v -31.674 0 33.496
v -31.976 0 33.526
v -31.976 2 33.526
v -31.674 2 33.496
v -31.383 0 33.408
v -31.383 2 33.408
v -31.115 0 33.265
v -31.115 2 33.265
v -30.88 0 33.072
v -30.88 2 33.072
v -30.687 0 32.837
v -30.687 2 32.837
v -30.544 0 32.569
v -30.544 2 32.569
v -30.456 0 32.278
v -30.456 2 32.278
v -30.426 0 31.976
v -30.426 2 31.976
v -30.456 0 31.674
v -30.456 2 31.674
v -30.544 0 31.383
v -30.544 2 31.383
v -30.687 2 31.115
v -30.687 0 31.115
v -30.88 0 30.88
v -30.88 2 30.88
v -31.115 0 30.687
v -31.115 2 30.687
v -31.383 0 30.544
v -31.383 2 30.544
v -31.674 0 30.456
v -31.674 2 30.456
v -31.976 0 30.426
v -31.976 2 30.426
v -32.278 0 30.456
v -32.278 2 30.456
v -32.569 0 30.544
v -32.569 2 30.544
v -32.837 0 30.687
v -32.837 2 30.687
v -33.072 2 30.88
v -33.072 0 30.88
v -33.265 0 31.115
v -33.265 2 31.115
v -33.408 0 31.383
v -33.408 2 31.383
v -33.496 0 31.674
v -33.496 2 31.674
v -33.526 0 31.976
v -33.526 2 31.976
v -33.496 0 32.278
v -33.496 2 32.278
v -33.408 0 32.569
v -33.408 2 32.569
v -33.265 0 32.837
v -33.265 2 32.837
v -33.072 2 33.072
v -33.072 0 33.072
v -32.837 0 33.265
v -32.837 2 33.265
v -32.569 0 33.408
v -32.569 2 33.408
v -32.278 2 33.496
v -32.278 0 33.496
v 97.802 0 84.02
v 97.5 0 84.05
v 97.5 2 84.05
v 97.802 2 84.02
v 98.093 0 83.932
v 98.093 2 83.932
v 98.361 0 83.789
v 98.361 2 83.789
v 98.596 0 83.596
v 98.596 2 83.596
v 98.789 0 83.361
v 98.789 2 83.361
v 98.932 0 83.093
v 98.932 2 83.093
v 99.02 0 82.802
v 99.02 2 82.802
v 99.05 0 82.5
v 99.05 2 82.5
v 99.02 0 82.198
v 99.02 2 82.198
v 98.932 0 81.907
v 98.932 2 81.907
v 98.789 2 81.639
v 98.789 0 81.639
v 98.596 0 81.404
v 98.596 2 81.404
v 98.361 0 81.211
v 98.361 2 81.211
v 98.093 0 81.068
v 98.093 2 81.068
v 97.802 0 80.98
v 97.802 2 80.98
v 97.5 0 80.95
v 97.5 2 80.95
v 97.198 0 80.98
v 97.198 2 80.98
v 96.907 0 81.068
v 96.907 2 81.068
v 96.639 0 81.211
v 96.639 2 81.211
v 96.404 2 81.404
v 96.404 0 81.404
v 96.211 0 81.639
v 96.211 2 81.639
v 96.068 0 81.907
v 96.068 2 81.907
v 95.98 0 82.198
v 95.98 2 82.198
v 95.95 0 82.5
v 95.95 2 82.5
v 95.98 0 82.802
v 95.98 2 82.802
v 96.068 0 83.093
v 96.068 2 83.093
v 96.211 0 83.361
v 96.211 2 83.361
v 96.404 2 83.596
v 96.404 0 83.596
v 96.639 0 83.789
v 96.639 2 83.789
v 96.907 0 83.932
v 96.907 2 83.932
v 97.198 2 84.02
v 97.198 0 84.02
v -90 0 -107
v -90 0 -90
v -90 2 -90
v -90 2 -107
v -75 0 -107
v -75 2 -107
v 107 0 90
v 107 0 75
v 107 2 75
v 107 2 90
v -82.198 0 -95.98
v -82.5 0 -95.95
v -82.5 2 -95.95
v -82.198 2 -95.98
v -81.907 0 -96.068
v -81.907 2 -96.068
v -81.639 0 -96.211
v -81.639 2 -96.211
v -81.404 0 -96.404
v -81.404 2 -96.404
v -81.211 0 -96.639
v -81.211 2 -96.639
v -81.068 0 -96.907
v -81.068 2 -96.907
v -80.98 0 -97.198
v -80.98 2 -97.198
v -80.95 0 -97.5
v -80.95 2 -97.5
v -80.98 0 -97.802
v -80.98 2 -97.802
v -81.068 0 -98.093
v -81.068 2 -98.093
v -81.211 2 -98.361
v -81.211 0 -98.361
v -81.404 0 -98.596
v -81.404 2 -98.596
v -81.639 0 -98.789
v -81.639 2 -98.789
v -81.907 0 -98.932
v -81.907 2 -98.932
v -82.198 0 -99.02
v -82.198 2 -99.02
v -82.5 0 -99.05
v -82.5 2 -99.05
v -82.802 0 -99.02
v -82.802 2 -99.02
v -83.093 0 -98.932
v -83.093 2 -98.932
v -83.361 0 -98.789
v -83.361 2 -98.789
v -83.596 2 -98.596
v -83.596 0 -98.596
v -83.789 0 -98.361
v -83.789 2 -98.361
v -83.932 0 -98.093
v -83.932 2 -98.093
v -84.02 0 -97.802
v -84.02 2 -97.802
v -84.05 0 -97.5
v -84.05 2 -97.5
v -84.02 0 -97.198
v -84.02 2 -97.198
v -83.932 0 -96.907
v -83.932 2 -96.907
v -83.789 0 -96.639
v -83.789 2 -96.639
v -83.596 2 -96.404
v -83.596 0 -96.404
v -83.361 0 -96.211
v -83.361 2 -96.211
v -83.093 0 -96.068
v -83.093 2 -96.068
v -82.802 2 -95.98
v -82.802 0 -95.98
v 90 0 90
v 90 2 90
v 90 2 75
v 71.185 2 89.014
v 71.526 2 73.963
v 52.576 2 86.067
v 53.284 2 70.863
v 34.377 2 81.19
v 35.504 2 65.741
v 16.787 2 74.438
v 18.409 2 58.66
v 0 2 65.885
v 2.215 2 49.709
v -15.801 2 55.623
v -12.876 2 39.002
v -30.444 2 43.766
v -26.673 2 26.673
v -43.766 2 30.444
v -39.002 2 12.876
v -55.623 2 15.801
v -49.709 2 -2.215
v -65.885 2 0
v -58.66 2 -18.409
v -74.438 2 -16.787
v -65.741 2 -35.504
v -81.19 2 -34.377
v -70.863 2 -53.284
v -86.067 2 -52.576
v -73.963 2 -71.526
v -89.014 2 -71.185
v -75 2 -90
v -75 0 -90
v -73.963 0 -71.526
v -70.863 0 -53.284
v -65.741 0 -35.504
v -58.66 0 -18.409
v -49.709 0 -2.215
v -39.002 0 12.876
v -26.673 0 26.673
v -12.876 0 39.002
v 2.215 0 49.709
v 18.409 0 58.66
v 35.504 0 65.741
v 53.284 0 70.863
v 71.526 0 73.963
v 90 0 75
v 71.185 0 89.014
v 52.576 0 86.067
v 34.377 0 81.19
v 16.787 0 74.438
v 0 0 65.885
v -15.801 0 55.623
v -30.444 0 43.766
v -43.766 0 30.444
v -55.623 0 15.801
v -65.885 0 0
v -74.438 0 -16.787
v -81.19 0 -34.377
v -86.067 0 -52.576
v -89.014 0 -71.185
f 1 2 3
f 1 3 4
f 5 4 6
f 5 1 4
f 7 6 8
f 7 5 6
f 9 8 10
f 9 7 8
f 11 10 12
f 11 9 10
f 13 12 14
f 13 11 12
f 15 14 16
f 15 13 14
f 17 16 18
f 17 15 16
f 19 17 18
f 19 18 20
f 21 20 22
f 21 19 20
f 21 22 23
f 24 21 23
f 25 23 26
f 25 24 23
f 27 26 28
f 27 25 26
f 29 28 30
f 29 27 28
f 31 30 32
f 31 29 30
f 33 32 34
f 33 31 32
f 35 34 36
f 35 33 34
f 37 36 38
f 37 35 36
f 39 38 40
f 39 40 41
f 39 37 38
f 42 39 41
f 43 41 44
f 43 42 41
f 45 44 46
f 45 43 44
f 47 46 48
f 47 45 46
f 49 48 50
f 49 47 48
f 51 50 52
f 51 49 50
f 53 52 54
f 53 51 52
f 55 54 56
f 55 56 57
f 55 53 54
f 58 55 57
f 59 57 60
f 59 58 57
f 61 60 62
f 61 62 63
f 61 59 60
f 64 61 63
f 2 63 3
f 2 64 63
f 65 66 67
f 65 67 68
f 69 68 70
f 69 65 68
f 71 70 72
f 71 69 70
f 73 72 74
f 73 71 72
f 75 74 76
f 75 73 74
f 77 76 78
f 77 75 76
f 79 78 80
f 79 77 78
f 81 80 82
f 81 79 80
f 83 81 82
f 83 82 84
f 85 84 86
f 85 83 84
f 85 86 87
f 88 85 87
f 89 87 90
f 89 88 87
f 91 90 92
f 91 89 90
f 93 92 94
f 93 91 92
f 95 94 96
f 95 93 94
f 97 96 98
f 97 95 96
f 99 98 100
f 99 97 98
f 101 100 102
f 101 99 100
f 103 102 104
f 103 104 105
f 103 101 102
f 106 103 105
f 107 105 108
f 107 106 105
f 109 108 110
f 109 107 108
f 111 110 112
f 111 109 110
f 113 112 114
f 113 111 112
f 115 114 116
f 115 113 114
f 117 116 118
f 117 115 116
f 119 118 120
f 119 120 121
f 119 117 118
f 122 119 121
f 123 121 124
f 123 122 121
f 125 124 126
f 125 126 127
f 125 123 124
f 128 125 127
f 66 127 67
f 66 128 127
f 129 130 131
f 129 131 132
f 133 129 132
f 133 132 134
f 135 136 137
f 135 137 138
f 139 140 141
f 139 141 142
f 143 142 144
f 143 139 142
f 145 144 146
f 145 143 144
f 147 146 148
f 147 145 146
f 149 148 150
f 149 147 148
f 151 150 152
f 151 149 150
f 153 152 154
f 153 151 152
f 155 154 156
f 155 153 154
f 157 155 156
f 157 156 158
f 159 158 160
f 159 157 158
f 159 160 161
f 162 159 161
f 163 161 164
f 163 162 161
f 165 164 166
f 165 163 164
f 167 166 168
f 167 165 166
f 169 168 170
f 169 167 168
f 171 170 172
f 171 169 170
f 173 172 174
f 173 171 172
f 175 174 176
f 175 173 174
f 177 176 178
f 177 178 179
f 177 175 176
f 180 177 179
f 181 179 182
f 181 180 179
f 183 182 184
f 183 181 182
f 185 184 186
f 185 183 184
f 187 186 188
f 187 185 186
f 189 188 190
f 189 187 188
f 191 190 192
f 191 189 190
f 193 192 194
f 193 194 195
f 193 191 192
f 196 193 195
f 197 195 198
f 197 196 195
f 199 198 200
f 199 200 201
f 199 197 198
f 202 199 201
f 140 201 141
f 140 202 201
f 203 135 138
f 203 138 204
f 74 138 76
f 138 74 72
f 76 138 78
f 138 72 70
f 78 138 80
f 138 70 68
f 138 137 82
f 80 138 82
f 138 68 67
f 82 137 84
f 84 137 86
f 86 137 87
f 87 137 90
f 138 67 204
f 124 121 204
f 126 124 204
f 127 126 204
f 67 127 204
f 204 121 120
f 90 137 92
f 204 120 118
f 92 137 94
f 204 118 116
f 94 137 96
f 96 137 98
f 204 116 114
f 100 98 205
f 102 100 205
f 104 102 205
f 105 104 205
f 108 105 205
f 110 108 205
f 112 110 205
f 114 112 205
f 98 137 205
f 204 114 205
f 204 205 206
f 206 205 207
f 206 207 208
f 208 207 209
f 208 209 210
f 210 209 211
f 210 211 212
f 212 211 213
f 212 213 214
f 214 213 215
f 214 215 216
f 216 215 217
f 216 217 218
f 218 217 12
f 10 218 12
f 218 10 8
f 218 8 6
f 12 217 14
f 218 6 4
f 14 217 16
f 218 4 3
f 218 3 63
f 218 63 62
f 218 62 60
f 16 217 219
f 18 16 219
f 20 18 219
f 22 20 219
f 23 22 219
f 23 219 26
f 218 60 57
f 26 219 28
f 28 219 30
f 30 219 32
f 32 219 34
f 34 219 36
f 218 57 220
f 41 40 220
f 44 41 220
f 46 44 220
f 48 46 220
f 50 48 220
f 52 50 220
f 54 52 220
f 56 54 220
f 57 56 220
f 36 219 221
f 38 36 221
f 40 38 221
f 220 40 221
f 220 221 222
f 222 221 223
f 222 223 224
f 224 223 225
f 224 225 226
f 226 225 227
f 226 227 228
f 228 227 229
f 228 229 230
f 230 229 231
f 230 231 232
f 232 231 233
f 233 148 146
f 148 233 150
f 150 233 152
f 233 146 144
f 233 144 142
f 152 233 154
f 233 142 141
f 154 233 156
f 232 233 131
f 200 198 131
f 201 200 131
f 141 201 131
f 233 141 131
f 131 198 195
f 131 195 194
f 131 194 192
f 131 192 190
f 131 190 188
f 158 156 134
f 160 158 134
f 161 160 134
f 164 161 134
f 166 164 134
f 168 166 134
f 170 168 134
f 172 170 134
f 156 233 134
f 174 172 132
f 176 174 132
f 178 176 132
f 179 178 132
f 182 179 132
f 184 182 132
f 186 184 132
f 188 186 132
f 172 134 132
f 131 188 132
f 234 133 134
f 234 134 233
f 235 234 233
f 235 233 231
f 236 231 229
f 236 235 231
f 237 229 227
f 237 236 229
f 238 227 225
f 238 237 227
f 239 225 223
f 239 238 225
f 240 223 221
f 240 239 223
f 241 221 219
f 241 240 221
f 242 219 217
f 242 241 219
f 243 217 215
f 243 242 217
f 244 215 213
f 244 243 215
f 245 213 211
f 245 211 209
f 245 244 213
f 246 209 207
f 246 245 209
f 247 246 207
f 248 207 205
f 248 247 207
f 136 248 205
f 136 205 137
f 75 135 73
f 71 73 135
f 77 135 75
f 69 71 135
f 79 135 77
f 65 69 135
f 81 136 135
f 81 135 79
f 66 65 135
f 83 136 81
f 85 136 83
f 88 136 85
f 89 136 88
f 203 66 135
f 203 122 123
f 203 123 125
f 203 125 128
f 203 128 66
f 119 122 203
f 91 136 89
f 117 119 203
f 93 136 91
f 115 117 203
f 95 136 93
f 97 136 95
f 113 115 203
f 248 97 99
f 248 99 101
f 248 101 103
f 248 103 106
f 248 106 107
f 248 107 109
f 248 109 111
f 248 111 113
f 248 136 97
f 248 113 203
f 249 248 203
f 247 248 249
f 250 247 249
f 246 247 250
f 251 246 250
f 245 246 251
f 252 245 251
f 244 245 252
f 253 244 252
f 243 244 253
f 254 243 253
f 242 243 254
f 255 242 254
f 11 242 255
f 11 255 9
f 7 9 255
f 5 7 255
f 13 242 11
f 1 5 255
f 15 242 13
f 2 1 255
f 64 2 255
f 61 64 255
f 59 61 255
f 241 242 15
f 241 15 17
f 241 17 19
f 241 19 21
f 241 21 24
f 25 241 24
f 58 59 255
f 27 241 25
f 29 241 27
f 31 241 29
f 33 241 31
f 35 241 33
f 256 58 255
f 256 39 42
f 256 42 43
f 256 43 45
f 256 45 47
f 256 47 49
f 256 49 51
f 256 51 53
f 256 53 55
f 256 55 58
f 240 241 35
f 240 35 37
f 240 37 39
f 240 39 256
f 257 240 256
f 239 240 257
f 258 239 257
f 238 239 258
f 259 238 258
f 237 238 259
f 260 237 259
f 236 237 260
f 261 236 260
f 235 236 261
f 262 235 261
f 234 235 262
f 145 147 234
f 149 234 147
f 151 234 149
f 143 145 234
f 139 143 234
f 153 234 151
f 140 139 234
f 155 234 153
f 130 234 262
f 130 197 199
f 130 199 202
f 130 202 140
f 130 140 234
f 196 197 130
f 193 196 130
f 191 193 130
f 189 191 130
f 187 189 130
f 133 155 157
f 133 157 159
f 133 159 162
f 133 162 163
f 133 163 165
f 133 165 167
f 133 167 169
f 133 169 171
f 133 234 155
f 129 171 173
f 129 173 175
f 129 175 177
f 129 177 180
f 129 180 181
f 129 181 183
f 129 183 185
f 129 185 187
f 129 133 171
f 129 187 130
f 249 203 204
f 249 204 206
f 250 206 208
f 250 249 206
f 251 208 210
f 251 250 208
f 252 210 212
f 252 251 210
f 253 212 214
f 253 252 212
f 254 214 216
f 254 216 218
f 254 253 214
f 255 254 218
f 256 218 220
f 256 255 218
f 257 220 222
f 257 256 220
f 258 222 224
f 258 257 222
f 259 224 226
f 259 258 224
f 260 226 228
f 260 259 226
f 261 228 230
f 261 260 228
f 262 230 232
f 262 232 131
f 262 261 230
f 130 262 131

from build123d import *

# Parameters (mm, degrees)
SKETCH1_R           = 1.55
BOSS_EXTRUDE1_DEPTH = 2


with BuildPart() as part:
    # Sketch1 → Boss-Extrude1 (new body)
    with BuildSketch(Plane(origin=(0, 0, 0), x_dir=(1, 0, 0), z_dir=(0, 1, 0))):
        with BuildLine():
            Line((-90, 90), (-90, 107))
            Line((-90, 107), (-75, 107))
            Line((-75, 107), (-75, 90))
            ThreePointArc((-75, 90), (-26.672618896, -26.672618896), (90, -75))
            Line((90, -75), (107, -75))
            Line((107, -75), (107, -90))
            Line((107, -90), (90, -90))
            ThreePointArc((90, -90), (-37.279220614, -37.279220614), (-90, 90))
        make_face()
        with Locations(Location((-82.5, 97.5, 0), (0, 0, 270))):
            Circle(SKETCH1_R, mode=Mode.SUBTRACT)
        with Locations(Location((97.5, -82.5, 0), (0, 0, 270))):
            Circle(SKETCH1_R, mode=Mode.SUBTRACT)
        with Locations(Location((-31.975919755, -31.975919755, 0), (0, 0, 270))):
            Circle(SKETCH1_R, mode=Mode.SUBTRACT)
    extrude(amount=BOSS_EXTRUDE1_DEPTH)


solid = part.part
